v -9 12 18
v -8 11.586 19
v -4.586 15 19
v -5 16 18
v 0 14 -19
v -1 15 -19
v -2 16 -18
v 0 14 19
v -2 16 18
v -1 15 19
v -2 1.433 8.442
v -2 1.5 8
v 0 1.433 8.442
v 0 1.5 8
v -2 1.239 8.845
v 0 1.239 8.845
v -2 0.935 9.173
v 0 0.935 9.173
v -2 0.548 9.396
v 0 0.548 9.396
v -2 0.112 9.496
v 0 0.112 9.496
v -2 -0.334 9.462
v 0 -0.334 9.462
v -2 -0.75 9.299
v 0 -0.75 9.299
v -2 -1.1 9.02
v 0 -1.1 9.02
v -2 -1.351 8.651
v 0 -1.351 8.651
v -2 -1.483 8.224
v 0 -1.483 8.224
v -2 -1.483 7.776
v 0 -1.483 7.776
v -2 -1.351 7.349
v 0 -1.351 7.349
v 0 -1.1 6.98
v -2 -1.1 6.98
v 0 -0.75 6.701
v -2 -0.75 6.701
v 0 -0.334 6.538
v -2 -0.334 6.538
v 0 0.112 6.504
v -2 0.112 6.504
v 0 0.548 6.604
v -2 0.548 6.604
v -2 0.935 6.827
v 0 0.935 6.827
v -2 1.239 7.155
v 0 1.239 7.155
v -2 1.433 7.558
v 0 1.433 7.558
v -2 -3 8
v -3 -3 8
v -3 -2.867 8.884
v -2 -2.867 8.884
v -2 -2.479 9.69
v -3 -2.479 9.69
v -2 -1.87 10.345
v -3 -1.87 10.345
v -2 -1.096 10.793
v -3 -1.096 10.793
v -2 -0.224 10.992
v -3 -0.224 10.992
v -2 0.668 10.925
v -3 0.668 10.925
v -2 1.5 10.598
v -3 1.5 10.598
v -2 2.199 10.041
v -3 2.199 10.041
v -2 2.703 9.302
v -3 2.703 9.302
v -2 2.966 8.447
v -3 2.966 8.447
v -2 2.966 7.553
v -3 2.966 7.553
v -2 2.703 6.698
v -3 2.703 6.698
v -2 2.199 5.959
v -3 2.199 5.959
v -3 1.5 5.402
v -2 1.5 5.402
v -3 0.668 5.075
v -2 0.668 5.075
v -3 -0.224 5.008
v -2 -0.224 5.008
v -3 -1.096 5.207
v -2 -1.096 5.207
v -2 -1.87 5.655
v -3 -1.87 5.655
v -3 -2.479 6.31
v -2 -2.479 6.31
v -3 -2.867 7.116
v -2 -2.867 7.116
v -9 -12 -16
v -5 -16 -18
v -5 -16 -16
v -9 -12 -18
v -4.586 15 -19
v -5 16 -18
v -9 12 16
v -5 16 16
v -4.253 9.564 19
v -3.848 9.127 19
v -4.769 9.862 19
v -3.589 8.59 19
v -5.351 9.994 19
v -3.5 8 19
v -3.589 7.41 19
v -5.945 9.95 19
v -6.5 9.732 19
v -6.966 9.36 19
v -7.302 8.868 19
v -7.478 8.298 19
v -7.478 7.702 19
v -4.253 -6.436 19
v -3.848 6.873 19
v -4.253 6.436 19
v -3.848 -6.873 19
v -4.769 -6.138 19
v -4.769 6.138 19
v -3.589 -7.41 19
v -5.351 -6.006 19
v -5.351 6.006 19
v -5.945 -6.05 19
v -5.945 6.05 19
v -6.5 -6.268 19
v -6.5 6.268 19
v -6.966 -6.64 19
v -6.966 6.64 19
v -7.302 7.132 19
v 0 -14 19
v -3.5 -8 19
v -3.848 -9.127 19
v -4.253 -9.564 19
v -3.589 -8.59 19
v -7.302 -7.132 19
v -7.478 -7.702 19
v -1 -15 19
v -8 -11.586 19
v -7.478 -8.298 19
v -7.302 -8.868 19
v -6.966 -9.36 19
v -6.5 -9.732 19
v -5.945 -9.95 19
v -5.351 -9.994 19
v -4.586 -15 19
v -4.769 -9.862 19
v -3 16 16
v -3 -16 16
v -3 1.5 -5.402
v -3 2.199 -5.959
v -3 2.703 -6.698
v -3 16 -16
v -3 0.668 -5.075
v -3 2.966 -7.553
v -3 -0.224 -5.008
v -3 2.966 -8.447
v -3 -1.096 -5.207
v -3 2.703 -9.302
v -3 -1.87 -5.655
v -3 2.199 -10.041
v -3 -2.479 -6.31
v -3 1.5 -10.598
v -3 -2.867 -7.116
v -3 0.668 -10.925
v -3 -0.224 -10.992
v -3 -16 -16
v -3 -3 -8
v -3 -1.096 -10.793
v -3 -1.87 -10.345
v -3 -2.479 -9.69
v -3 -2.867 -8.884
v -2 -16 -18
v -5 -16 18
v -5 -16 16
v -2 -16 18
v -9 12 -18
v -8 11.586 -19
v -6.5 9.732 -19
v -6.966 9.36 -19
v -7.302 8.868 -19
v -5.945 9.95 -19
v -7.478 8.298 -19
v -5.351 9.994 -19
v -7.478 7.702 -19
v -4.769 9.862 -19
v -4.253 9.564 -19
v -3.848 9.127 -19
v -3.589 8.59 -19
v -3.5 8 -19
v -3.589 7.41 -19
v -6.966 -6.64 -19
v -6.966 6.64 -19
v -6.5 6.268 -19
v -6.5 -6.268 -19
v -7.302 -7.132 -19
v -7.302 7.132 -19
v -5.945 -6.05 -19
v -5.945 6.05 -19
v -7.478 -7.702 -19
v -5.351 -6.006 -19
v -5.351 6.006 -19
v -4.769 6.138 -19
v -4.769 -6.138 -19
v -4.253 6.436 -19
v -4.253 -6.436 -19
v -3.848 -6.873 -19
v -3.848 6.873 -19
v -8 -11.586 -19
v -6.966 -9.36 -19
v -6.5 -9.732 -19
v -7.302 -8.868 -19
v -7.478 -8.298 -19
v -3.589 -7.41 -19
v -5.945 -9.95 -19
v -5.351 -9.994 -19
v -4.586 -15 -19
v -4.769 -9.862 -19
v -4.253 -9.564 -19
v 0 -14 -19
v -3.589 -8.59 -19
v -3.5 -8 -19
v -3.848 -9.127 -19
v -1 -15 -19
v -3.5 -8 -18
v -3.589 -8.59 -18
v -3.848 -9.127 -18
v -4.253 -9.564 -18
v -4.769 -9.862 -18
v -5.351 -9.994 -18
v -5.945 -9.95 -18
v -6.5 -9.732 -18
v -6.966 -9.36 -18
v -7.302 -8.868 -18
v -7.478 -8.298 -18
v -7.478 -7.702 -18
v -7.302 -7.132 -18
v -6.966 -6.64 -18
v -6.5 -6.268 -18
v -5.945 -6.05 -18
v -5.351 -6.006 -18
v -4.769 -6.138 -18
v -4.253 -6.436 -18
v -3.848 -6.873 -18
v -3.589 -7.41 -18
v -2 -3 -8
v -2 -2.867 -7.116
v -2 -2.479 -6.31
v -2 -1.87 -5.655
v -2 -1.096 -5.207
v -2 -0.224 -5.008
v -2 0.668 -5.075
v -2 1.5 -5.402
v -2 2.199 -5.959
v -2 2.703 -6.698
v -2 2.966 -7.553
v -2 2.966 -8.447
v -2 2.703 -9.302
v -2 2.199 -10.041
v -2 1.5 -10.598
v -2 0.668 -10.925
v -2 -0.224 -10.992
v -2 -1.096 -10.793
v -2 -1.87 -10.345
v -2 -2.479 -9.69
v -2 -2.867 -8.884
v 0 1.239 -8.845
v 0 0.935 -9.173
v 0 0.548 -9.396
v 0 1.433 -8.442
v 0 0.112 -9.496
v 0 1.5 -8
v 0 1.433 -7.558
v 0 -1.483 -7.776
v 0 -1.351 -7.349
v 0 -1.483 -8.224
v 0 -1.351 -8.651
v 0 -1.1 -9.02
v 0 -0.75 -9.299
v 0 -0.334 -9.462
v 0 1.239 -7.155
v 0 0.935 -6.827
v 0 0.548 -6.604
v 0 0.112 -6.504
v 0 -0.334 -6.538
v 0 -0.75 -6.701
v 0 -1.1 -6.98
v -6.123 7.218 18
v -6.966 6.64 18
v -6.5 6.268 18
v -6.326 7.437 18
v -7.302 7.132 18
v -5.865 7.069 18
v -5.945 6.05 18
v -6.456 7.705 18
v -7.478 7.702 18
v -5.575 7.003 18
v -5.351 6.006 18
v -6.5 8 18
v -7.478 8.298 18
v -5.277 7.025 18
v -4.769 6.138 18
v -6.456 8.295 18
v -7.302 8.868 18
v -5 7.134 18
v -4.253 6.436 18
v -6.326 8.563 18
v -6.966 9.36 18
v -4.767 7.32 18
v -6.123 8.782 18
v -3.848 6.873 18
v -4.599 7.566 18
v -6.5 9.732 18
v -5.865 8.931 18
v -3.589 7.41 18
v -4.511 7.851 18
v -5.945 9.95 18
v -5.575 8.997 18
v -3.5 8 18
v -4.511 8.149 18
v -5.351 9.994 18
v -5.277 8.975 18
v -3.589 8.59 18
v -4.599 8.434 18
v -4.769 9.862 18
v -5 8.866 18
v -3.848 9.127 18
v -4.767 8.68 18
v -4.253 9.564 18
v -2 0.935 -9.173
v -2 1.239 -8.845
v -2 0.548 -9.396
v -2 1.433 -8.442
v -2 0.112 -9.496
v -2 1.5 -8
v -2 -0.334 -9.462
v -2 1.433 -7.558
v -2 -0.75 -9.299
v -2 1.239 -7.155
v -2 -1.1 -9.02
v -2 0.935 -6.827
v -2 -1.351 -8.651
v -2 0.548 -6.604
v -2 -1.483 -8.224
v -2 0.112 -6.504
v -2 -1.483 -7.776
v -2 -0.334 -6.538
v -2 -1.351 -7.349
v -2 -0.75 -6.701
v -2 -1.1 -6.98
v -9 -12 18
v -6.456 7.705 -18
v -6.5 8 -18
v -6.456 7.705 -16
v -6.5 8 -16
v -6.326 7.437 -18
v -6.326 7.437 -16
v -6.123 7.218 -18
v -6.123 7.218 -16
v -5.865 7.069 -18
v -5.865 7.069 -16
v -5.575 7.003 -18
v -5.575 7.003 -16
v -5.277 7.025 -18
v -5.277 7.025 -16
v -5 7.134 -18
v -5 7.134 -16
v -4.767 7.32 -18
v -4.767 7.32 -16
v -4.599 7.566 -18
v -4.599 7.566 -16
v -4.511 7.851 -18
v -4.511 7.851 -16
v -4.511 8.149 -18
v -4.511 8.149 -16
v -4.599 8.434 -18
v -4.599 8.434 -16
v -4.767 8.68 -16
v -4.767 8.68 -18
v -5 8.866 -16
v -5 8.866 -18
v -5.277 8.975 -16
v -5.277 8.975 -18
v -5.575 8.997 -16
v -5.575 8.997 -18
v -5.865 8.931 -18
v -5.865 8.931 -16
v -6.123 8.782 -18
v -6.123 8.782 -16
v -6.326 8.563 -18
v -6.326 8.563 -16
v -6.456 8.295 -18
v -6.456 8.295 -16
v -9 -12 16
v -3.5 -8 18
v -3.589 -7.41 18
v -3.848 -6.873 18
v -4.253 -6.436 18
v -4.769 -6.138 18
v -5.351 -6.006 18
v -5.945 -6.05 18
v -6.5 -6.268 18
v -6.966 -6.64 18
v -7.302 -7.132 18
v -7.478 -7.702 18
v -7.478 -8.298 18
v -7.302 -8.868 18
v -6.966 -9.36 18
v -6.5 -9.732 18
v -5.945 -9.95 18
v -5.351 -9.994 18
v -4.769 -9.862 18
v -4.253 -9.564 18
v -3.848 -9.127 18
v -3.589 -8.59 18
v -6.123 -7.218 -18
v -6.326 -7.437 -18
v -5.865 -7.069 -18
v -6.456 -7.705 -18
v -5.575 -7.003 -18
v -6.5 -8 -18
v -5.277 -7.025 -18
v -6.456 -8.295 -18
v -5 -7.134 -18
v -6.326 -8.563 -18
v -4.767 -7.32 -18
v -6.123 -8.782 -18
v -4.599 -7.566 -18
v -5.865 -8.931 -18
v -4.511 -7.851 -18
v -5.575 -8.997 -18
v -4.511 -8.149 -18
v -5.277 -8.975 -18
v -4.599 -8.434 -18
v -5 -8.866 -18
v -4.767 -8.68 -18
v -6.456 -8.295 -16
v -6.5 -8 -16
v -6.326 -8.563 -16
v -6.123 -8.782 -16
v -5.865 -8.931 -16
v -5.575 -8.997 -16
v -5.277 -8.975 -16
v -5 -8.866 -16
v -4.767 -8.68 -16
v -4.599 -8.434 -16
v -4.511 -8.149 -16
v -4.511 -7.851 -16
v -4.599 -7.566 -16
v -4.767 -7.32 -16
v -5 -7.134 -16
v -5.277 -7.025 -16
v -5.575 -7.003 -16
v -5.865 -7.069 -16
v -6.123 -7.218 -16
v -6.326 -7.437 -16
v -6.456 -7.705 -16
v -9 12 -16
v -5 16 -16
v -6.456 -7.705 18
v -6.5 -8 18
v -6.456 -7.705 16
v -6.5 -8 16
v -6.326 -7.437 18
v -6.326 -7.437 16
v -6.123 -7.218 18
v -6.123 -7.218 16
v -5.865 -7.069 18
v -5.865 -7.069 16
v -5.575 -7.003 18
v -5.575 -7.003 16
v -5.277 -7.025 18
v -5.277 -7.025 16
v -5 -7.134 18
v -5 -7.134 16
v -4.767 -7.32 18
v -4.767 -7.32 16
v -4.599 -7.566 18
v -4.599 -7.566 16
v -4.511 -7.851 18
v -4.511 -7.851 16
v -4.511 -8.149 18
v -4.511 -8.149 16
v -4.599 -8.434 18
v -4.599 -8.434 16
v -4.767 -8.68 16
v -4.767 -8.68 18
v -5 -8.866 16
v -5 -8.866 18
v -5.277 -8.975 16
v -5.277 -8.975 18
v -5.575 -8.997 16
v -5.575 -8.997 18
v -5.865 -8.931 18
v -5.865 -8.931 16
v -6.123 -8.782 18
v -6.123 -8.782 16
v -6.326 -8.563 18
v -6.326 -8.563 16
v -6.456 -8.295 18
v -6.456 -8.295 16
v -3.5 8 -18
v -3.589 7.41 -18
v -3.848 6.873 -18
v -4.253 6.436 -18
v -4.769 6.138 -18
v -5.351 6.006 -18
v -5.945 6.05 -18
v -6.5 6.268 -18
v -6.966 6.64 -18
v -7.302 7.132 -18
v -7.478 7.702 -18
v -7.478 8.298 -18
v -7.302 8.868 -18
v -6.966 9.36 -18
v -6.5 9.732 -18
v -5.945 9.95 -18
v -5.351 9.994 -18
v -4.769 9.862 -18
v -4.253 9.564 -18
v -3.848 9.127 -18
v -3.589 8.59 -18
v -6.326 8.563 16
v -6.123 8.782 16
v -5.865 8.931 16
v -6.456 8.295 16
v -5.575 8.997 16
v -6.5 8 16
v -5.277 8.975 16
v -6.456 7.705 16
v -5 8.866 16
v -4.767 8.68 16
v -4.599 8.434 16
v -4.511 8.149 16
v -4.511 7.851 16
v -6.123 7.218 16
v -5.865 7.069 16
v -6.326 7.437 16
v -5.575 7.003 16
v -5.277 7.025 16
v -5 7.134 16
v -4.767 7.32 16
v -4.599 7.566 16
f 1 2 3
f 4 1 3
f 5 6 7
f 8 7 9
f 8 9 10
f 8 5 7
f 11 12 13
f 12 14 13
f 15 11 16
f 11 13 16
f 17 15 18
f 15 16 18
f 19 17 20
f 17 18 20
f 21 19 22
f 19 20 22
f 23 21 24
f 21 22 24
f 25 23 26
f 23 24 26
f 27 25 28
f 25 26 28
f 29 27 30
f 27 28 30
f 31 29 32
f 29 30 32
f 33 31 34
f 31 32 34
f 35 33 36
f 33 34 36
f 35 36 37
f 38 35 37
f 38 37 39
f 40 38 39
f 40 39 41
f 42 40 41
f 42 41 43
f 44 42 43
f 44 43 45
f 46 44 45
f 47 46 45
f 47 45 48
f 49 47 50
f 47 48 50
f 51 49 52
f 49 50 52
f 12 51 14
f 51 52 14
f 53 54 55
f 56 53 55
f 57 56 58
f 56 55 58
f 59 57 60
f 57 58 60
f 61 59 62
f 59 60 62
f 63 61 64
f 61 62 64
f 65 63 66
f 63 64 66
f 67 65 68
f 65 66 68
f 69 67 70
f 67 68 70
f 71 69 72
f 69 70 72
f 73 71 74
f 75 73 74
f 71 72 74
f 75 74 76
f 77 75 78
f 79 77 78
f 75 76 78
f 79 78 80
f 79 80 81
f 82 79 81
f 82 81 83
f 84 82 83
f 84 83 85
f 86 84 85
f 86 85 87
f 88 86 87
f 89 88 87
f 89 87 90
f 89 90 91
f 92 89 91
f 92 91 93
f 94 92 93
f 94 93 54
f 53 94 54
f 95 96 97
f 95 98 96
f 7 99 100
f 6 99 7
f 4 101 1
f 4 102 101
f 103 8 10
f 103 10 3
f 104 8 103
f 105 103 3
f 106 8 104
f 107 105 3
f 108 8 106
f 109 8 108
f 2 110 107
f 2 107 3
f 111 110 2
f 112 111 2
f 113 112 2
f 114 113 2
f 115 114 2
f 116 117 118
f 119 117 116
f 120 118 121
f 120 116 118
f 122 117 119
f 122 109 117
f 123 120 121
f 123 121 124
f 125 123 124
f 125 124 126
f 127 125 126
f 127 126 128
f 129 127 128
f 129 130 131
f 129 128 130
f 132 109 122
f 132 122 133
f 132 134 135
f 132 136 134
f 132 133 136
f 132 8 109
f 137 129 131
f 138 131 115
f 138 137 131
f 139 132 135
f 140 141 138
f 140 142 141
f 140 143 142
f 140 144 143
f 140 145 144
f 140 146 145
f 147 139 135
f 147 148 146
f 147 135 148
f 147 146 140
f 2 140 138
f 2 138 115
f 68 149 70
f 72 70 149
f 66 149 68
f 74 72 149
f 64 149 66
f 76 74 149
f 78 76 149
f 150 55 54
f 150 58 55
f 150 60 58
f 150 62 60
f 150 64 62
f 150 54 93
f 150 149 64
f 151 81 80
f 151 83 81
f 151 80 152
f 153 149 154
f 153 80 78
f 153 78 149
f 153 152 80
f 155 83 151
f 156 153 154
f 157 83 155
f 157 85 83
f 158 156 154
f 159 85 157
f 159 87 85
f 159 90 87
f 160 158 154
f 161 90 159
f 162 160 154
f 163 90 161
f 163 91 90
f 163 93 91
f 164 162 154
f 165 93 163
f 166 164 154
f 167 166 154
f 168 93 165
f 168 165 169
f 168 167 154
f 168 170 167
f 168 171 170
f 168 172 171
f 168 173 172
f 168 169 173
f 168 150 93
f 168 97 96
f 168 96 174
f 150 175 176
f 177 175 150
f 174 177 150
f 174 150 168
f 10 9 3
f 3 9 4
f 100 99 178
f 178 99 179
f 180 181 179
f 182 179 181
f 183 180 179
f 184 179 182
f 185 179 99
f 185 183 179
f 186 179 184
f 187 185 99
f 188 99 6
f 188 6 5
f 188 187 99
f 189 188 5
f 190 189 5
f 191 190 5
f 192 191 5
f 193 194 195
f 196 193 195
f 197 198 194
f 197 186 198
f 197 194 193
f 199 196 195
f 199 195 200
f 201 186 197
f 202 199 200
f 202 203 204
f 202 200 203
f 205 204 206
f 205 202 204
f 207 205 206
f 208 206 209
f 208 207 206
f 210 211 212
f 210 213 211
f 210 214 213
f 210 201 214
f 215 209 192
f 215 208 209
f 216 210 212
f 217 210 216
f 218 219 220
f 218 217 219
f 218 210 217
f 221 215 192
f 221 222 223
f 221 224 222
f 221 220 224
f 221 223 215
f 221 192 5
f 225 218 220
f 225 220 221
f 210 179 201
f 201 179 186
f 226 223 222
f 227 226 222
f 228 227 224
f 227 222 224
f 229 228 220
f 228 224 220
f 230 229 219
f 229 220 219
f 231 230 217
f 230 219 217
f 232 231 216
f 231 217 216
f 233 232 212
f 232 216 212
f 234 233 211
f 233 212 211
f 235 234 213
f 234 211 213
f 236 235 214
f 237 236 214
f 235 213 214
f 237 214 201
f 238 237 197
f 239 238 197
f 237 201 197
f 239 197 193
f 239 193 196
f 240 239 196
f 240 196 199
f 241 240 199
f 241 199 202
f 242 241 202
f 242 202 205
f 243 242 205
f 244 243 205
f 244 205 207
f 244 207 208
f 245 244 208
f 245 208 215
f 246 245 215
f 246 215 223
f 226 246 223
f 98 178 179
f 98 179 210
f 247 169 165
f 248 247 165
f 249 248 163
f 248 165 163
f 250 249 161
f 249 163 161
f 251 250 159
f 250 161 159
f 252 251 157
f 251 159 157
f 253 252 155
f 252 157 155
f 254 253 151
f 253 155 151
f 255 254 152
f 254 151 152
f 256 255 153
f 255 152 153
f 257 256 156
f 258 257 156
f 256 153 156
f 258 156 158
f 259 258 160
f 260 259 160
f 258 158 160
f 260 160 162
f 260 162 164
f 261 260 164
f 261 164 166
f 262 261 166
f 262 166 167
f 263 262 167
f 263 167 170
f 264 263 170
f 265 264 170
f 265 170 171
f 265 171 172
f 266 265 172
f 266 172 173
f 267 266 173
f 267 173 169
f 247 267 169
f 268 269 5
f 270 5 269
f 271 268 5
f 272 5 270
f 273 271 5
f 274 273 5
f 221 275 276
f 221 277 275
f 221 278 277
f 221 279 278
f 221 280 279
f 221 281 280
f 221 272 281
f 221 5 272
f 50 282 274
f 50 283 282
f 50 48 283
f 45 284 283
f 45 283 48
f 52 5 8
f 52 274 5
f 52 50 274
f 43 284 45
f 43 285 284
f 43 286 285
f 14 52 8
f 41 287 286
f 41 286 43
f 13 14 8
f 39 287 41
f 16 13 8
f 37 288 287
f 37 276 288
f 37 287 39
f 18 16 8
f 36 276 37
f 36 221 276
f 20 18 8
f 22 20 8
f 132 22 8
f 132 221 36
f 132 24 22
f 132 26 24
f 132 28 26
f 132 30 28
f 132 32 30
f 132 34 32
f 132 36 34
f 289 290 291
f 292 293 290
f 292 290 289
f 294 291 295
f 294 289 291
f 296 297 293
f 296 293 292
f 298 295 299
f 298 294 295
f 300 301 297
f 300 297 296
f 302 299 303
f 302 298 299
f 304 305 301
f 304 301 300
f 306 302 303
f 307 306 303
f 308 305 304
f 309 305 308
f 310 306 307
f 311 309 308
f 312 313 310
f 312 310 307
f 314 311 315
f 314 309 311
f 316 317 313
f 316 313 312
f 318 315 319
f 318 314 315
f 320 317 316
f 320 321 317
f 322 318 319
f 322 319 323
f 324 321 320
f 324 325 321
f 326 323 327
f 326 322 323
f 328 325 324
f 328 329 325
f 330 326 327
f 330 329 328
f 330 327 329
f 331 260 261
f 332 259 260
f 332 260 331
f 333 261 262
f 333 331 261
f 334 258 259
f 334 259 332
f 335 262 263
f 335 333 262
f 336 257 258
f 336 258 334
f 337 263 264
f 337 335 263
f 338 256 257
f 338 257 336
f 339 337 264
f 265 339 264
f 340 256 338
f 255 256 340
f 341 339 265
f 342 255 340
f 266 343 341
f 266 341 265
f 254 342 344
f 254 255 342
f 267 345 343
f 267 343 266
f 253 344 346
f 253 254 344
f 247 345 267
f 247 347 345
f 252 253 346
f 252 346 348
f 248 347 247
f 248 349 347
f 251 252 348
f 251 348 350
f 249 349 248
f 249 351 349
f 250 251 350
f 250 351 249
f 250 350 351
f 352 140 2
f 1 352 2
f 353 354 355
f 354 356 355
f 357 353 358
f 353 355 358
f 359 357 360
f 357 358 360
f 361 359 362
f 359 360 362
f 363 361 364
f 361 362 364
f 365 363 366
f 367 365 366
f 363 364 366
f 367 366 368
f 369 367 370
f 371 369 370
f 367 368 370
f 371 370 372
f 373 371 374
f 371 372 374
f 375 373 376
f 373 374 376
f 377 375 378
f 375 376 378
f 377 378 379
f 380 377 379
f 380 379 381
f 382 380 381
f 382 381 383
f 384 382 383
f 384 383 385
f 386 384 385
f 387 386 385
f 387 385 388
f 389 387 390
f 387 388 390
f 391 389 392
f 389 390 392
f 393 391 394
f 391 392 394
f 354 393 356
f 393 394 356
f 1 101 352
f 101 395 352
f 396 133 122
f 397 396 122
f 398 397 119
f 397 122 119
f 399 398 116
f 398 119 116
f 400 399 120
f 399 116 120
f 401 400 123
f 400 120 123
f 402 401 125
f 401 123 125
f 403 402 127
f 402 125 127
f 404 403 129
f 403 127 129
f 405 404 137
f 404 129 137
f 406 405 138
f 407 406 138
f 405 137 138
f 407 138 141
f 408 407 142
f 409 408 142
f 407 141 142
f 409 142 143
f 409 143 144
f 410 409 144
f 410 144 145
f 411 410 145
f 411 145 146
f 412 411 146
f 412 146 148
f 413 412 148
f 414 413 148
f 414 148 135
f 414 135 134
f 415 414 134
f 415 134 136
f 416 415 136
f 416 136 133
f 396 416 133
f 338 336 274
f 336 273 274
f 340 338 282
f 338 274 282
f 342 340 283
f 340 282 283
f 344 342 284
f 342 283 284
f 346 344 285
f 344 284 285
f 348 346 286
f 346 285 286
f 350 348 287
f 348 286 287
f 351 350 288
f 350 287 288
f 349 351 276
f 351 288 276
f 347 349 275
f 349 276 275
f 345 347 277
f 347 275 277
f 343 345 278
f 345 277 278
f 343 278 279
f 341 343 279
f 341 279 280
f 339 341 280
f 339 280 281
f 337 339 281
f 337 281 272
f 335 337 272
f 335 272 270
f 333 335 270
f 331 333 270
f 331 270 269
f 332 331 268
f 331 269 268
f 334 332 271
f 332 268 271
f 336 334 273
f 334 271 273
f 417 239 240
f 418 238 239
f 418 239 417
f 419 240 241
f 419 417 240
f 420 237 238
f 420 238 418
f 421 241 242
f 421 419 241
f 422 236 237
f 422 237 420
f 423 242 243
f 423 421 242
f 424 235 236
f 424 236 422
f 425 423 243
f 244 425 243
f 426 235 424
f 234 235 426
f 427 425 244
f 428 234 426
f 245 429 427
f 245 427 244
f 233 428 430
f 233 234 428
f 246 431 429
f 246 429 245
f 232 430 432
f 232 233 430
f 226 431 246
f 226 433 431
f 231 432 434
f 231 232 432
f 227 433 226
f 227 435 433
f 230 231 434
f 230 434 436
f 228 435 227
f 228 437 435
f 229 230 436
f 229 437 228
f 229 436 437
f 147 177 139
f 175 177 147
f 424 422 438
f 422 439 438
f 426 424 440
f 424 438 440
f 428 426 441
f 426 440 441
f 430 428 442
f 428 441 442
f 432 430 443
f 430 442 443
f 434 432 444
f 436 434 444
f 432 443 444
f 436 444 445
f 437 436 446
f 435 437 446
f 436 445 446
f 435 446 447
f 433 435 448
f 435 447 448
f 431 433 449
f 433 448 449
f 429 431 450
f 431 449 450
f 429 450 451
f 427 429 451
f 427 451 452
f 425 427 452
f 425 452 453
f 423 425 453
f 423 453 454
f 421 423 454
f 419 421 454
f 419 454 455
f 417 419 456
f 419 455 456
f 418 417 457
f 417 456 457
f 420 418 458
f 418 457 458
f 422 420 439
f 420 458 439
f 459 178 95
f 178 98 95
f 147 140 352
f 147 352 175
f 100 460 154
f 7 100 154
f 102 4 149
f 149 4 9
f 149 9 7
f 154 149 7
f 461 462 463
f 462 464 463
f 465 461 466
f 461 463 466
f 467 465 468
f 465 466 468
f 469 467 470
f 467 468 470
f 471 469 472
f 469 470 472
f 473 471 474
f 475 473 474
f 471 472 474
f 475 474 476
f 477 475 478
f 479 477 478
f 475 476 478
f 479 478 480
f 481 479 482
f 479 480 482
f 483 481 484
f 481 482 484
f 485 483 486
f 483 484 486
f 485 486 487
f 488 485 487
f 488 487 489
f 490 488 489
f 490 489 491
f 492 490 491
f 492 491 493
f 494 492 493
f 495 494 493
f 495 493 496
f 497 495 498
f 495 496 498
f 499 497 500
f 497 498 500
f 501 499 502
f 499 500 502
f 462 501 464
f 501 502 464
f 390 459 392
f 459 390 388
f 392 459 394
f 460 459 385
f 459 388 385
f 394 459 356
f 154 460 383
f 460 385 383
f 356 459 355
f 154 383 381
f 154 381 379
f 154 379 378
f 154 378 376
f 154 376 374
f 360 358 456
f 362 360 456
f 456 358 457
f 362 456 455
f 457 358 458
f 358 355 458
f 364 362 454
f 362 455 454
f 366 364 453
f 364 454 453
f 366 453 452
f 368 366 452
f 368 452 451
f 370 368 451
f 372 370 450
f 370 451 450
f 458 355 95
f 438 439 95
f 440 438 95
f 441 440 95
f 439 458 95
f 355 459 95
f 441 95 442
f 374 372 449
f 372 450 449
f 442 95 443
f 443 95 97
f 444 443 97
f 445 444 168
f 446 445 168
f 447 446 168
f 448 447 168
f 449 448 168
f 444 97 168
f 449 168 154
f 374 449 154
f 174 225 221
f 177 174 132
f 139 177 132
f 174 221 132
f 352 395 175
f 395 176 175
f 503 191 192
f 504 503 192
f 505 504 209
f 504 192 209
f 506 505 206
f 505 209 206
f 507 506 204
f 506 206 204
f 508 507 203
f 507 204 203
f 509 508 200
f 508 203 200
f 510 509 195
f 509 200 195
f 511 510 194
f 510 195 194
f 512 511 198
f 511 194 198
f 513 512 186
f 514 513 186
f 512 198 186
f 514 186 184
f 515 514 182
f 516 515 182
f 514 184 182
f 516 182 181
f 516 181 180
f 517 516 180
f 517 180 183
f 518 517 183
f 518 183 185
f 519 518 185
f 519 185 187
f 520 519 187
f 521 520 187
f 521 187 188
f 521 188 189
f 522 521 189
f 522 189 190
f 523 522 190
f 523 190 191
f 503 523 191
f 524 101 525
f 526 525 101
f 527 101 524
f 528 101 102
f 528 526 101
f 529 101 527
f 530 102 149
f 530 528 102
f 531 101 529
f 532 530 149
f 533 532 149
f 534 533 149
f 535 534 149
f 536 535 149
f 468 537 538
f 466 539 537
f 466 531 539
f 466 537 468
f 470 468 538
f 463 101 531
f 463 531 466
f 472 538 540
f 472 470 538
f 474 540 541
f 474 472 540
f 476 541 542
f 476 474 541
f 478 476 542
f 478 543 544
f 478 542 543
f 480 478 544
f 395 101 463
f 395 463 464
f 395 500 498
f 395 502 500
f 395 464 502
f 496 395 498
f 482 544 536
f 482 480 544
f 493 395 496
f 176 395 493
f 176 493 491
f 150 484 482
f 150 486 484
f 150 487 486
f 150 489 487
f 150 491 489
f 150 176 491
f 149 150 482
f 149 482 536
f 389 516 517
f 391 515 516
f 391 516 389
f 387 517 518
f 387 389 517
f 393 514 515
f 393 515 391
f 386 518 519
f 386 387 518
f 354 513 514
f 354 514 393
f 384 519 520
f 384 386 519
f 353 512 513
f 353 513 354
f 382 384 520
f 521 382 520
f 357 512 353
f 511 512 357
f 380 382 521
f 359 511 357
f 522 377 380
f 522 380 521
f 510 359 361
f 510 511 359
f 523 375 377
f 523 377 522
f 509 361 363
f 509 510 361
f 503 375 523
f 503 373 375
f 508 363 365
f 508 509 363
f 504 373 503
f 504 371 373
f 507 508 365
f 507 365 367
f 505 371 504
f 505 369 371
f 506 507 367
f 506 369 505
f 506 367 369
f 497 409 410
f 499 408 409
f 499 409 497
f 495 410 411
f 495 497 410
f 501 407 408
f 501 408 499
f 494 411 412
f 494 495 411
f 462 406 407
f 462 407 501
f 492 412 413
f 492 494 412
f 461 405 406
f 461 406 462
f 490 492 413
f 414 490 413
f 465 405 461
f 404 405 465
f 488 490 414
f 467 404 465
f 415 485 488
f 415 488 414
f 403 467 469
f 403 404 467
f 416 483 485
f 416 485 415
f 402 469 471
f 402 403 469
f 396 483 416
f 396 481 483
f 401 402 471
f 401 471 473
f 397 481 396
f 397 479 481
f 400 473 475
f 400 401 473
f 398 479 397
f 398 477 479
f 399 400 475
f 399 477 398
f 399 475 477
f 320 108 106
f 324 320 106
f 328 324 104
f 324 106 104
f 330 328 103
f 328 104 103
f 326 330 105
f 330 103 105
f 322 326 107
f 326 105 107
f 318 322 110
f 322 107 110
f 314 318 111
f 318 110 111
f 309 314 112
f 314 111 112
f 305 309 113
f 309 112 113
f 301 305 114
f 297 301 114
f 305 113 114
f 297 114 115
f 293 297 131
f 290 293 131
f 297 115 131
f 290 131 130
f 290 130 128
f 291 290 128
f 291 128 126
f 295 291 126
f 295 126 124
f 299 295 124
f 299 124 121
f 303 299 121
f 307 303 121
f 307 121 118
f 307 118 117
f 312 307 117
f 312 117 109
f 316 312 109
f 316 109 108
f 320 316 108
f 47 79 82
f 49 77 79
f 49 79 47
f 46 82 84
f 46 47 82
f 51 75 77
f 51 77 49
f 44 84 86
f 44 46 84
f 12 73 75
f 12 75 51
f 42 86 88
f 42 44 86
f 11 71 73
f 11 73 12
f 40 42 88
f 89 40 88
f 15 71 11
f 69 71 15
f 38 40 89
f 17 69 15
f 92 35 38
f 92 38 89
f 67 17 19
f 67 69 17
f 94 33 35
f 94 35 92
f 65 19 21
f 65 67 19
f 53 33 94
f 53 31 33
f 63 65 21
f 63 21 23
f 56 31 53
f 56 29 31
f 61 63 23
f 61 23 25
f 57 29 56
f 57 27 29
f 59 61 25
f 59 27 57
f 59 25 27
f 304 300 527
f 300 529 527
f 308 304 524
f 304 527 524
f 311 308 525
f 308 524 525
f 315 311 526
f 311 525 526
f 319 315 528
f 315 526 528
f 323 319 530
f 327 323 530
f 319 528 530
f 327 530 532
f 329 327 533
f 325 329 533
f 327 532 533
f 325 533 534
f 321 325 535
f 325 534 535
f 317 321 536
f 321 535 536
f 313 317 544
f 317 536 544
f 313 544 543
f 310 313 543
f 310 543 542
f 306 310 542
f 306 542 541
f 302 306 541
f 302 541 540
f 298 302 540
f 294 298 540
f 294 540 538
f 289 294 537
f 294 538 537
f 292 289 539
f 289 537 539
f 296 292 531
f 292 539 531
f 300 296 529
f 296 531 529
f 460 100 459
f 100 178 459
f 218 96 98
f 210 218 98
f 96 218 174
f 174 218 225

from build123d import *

# Parameters (mm, degrees)
F0_W           = 6
F0_H           = 3
F1_DEPTH       = 16
F3_D           = 2
F3_DEPTH       = 5
F3_CBORE_D     = 4
F3_CBORE_DEPTH = 1
F3_TIP         = 0.600860619
F5_D           = 2
F5_DEPTH       = 5
F5_CBORE_D     = 4
F5_CBORE_DEPTH = 1
F5_TIP         = 0.600860619
F6_SIZE        = 4
F8_D           = 3
F8_CBORE_D     = 6
F8_CBORE_DEPTH = 1
F9_SIZE        = 1
F10_SIZE       = 2


with BuildPart() as f1:
    # F0 (on Front) → F1 (new body, symmetric)
    with BuildSketch(Plane.XZ):
        with Locations((-6, 17.5)):
            Rectangle(F0_W, F0_H)
        Polygon((0, -19), (0, 19), (-3, 19), (-3, 16), (-3, -16), (-3, -19), align=None)
        with Locations((-6, -17.5)):
            Rectangle(F0_W, F0_H)
    extrude(amount=F1_DEPTH, both=True)

    # F3
    with Locations(Plane.XY.offset(19)):
        with Locations((-5.5, 8), (-5.5, -8)):
            CounterBoreHole(F3_D / 2, F3_CBORE_D / 2, F3_CBORE_DEPTH, depth=F3_DEPTH)
            with Locations((0, 0, -(F3_DEPTH + F3_TIP / 2))):  # 118° drill point
                Cone(0, F3_D / 2, F3_TIP, mode=Mode.SUBTRACT)

    # F5
    with Locations(Plane(origin=(0, 0, -19), x_dir=(1, 0, 0), z_dir=(0, 0, -1))):
        with Locations((-5.5, -8), (-5.5, 8)):
            CounterBoreHole(F5_D / 2, F5_CBORE_D / 2, F5_CBORE_DEPTH, depth=F5_DEPTH)
            with Locations((0, 0, -(F5_DEPTH + F5_TIP / 2))):  # 118° drill point
                Cone(0, F5_D / 2, F5_TIP, mode=Mode.SUBTRACT)

    # F6
    f6_edges = [f1.edges().sort_by_distance(p)[0] for p in [
        (-9, -16, 17.5),
        (-9, 16, 17.5),
        (-9, 16, -17.5),
        (-9, -16, -17.5),
    ]]
    chamfer(f6_edges, length=F6_SIZE)

    # F8 (through all)
    with Locations(Plane(origin=(-3, 0, 0), x_dir=(0, -1, 0), z_dir=(-1, 0, 0))):
        with Locations((0, 8), (0, -8)):
            CounterBoreHole(F8_D / 2, F8_CBORE_D / 2, F8_CBORE_DEPTH)

    # F9
    f9_edges = [f1.edges().sort_by_distance(p)[0] for p in [
        (-2.5, 16, 19),
        (-7, 14, 19),
        (-9, 0, 19),
        (-7, -14, 19),
        (-2.5, -16, 19),
        (-2.5, 16, -19),
        (-7, 14, -19),
        (-9, 0, -19),
        (-7, -14, -19),
        (-2.5, -16, -19),
    ]]
    chamfer(f9_edges, length=F9_SIZE)

    # F10
    f10_edges = [f1.edges().sort_by_distance(p)[0] for p in [
        (0, 16, 0),
        (0, -16, 0),
    ]]
    chamfer(f10_edges, length=F10_SIZE)


solid = f1.part
